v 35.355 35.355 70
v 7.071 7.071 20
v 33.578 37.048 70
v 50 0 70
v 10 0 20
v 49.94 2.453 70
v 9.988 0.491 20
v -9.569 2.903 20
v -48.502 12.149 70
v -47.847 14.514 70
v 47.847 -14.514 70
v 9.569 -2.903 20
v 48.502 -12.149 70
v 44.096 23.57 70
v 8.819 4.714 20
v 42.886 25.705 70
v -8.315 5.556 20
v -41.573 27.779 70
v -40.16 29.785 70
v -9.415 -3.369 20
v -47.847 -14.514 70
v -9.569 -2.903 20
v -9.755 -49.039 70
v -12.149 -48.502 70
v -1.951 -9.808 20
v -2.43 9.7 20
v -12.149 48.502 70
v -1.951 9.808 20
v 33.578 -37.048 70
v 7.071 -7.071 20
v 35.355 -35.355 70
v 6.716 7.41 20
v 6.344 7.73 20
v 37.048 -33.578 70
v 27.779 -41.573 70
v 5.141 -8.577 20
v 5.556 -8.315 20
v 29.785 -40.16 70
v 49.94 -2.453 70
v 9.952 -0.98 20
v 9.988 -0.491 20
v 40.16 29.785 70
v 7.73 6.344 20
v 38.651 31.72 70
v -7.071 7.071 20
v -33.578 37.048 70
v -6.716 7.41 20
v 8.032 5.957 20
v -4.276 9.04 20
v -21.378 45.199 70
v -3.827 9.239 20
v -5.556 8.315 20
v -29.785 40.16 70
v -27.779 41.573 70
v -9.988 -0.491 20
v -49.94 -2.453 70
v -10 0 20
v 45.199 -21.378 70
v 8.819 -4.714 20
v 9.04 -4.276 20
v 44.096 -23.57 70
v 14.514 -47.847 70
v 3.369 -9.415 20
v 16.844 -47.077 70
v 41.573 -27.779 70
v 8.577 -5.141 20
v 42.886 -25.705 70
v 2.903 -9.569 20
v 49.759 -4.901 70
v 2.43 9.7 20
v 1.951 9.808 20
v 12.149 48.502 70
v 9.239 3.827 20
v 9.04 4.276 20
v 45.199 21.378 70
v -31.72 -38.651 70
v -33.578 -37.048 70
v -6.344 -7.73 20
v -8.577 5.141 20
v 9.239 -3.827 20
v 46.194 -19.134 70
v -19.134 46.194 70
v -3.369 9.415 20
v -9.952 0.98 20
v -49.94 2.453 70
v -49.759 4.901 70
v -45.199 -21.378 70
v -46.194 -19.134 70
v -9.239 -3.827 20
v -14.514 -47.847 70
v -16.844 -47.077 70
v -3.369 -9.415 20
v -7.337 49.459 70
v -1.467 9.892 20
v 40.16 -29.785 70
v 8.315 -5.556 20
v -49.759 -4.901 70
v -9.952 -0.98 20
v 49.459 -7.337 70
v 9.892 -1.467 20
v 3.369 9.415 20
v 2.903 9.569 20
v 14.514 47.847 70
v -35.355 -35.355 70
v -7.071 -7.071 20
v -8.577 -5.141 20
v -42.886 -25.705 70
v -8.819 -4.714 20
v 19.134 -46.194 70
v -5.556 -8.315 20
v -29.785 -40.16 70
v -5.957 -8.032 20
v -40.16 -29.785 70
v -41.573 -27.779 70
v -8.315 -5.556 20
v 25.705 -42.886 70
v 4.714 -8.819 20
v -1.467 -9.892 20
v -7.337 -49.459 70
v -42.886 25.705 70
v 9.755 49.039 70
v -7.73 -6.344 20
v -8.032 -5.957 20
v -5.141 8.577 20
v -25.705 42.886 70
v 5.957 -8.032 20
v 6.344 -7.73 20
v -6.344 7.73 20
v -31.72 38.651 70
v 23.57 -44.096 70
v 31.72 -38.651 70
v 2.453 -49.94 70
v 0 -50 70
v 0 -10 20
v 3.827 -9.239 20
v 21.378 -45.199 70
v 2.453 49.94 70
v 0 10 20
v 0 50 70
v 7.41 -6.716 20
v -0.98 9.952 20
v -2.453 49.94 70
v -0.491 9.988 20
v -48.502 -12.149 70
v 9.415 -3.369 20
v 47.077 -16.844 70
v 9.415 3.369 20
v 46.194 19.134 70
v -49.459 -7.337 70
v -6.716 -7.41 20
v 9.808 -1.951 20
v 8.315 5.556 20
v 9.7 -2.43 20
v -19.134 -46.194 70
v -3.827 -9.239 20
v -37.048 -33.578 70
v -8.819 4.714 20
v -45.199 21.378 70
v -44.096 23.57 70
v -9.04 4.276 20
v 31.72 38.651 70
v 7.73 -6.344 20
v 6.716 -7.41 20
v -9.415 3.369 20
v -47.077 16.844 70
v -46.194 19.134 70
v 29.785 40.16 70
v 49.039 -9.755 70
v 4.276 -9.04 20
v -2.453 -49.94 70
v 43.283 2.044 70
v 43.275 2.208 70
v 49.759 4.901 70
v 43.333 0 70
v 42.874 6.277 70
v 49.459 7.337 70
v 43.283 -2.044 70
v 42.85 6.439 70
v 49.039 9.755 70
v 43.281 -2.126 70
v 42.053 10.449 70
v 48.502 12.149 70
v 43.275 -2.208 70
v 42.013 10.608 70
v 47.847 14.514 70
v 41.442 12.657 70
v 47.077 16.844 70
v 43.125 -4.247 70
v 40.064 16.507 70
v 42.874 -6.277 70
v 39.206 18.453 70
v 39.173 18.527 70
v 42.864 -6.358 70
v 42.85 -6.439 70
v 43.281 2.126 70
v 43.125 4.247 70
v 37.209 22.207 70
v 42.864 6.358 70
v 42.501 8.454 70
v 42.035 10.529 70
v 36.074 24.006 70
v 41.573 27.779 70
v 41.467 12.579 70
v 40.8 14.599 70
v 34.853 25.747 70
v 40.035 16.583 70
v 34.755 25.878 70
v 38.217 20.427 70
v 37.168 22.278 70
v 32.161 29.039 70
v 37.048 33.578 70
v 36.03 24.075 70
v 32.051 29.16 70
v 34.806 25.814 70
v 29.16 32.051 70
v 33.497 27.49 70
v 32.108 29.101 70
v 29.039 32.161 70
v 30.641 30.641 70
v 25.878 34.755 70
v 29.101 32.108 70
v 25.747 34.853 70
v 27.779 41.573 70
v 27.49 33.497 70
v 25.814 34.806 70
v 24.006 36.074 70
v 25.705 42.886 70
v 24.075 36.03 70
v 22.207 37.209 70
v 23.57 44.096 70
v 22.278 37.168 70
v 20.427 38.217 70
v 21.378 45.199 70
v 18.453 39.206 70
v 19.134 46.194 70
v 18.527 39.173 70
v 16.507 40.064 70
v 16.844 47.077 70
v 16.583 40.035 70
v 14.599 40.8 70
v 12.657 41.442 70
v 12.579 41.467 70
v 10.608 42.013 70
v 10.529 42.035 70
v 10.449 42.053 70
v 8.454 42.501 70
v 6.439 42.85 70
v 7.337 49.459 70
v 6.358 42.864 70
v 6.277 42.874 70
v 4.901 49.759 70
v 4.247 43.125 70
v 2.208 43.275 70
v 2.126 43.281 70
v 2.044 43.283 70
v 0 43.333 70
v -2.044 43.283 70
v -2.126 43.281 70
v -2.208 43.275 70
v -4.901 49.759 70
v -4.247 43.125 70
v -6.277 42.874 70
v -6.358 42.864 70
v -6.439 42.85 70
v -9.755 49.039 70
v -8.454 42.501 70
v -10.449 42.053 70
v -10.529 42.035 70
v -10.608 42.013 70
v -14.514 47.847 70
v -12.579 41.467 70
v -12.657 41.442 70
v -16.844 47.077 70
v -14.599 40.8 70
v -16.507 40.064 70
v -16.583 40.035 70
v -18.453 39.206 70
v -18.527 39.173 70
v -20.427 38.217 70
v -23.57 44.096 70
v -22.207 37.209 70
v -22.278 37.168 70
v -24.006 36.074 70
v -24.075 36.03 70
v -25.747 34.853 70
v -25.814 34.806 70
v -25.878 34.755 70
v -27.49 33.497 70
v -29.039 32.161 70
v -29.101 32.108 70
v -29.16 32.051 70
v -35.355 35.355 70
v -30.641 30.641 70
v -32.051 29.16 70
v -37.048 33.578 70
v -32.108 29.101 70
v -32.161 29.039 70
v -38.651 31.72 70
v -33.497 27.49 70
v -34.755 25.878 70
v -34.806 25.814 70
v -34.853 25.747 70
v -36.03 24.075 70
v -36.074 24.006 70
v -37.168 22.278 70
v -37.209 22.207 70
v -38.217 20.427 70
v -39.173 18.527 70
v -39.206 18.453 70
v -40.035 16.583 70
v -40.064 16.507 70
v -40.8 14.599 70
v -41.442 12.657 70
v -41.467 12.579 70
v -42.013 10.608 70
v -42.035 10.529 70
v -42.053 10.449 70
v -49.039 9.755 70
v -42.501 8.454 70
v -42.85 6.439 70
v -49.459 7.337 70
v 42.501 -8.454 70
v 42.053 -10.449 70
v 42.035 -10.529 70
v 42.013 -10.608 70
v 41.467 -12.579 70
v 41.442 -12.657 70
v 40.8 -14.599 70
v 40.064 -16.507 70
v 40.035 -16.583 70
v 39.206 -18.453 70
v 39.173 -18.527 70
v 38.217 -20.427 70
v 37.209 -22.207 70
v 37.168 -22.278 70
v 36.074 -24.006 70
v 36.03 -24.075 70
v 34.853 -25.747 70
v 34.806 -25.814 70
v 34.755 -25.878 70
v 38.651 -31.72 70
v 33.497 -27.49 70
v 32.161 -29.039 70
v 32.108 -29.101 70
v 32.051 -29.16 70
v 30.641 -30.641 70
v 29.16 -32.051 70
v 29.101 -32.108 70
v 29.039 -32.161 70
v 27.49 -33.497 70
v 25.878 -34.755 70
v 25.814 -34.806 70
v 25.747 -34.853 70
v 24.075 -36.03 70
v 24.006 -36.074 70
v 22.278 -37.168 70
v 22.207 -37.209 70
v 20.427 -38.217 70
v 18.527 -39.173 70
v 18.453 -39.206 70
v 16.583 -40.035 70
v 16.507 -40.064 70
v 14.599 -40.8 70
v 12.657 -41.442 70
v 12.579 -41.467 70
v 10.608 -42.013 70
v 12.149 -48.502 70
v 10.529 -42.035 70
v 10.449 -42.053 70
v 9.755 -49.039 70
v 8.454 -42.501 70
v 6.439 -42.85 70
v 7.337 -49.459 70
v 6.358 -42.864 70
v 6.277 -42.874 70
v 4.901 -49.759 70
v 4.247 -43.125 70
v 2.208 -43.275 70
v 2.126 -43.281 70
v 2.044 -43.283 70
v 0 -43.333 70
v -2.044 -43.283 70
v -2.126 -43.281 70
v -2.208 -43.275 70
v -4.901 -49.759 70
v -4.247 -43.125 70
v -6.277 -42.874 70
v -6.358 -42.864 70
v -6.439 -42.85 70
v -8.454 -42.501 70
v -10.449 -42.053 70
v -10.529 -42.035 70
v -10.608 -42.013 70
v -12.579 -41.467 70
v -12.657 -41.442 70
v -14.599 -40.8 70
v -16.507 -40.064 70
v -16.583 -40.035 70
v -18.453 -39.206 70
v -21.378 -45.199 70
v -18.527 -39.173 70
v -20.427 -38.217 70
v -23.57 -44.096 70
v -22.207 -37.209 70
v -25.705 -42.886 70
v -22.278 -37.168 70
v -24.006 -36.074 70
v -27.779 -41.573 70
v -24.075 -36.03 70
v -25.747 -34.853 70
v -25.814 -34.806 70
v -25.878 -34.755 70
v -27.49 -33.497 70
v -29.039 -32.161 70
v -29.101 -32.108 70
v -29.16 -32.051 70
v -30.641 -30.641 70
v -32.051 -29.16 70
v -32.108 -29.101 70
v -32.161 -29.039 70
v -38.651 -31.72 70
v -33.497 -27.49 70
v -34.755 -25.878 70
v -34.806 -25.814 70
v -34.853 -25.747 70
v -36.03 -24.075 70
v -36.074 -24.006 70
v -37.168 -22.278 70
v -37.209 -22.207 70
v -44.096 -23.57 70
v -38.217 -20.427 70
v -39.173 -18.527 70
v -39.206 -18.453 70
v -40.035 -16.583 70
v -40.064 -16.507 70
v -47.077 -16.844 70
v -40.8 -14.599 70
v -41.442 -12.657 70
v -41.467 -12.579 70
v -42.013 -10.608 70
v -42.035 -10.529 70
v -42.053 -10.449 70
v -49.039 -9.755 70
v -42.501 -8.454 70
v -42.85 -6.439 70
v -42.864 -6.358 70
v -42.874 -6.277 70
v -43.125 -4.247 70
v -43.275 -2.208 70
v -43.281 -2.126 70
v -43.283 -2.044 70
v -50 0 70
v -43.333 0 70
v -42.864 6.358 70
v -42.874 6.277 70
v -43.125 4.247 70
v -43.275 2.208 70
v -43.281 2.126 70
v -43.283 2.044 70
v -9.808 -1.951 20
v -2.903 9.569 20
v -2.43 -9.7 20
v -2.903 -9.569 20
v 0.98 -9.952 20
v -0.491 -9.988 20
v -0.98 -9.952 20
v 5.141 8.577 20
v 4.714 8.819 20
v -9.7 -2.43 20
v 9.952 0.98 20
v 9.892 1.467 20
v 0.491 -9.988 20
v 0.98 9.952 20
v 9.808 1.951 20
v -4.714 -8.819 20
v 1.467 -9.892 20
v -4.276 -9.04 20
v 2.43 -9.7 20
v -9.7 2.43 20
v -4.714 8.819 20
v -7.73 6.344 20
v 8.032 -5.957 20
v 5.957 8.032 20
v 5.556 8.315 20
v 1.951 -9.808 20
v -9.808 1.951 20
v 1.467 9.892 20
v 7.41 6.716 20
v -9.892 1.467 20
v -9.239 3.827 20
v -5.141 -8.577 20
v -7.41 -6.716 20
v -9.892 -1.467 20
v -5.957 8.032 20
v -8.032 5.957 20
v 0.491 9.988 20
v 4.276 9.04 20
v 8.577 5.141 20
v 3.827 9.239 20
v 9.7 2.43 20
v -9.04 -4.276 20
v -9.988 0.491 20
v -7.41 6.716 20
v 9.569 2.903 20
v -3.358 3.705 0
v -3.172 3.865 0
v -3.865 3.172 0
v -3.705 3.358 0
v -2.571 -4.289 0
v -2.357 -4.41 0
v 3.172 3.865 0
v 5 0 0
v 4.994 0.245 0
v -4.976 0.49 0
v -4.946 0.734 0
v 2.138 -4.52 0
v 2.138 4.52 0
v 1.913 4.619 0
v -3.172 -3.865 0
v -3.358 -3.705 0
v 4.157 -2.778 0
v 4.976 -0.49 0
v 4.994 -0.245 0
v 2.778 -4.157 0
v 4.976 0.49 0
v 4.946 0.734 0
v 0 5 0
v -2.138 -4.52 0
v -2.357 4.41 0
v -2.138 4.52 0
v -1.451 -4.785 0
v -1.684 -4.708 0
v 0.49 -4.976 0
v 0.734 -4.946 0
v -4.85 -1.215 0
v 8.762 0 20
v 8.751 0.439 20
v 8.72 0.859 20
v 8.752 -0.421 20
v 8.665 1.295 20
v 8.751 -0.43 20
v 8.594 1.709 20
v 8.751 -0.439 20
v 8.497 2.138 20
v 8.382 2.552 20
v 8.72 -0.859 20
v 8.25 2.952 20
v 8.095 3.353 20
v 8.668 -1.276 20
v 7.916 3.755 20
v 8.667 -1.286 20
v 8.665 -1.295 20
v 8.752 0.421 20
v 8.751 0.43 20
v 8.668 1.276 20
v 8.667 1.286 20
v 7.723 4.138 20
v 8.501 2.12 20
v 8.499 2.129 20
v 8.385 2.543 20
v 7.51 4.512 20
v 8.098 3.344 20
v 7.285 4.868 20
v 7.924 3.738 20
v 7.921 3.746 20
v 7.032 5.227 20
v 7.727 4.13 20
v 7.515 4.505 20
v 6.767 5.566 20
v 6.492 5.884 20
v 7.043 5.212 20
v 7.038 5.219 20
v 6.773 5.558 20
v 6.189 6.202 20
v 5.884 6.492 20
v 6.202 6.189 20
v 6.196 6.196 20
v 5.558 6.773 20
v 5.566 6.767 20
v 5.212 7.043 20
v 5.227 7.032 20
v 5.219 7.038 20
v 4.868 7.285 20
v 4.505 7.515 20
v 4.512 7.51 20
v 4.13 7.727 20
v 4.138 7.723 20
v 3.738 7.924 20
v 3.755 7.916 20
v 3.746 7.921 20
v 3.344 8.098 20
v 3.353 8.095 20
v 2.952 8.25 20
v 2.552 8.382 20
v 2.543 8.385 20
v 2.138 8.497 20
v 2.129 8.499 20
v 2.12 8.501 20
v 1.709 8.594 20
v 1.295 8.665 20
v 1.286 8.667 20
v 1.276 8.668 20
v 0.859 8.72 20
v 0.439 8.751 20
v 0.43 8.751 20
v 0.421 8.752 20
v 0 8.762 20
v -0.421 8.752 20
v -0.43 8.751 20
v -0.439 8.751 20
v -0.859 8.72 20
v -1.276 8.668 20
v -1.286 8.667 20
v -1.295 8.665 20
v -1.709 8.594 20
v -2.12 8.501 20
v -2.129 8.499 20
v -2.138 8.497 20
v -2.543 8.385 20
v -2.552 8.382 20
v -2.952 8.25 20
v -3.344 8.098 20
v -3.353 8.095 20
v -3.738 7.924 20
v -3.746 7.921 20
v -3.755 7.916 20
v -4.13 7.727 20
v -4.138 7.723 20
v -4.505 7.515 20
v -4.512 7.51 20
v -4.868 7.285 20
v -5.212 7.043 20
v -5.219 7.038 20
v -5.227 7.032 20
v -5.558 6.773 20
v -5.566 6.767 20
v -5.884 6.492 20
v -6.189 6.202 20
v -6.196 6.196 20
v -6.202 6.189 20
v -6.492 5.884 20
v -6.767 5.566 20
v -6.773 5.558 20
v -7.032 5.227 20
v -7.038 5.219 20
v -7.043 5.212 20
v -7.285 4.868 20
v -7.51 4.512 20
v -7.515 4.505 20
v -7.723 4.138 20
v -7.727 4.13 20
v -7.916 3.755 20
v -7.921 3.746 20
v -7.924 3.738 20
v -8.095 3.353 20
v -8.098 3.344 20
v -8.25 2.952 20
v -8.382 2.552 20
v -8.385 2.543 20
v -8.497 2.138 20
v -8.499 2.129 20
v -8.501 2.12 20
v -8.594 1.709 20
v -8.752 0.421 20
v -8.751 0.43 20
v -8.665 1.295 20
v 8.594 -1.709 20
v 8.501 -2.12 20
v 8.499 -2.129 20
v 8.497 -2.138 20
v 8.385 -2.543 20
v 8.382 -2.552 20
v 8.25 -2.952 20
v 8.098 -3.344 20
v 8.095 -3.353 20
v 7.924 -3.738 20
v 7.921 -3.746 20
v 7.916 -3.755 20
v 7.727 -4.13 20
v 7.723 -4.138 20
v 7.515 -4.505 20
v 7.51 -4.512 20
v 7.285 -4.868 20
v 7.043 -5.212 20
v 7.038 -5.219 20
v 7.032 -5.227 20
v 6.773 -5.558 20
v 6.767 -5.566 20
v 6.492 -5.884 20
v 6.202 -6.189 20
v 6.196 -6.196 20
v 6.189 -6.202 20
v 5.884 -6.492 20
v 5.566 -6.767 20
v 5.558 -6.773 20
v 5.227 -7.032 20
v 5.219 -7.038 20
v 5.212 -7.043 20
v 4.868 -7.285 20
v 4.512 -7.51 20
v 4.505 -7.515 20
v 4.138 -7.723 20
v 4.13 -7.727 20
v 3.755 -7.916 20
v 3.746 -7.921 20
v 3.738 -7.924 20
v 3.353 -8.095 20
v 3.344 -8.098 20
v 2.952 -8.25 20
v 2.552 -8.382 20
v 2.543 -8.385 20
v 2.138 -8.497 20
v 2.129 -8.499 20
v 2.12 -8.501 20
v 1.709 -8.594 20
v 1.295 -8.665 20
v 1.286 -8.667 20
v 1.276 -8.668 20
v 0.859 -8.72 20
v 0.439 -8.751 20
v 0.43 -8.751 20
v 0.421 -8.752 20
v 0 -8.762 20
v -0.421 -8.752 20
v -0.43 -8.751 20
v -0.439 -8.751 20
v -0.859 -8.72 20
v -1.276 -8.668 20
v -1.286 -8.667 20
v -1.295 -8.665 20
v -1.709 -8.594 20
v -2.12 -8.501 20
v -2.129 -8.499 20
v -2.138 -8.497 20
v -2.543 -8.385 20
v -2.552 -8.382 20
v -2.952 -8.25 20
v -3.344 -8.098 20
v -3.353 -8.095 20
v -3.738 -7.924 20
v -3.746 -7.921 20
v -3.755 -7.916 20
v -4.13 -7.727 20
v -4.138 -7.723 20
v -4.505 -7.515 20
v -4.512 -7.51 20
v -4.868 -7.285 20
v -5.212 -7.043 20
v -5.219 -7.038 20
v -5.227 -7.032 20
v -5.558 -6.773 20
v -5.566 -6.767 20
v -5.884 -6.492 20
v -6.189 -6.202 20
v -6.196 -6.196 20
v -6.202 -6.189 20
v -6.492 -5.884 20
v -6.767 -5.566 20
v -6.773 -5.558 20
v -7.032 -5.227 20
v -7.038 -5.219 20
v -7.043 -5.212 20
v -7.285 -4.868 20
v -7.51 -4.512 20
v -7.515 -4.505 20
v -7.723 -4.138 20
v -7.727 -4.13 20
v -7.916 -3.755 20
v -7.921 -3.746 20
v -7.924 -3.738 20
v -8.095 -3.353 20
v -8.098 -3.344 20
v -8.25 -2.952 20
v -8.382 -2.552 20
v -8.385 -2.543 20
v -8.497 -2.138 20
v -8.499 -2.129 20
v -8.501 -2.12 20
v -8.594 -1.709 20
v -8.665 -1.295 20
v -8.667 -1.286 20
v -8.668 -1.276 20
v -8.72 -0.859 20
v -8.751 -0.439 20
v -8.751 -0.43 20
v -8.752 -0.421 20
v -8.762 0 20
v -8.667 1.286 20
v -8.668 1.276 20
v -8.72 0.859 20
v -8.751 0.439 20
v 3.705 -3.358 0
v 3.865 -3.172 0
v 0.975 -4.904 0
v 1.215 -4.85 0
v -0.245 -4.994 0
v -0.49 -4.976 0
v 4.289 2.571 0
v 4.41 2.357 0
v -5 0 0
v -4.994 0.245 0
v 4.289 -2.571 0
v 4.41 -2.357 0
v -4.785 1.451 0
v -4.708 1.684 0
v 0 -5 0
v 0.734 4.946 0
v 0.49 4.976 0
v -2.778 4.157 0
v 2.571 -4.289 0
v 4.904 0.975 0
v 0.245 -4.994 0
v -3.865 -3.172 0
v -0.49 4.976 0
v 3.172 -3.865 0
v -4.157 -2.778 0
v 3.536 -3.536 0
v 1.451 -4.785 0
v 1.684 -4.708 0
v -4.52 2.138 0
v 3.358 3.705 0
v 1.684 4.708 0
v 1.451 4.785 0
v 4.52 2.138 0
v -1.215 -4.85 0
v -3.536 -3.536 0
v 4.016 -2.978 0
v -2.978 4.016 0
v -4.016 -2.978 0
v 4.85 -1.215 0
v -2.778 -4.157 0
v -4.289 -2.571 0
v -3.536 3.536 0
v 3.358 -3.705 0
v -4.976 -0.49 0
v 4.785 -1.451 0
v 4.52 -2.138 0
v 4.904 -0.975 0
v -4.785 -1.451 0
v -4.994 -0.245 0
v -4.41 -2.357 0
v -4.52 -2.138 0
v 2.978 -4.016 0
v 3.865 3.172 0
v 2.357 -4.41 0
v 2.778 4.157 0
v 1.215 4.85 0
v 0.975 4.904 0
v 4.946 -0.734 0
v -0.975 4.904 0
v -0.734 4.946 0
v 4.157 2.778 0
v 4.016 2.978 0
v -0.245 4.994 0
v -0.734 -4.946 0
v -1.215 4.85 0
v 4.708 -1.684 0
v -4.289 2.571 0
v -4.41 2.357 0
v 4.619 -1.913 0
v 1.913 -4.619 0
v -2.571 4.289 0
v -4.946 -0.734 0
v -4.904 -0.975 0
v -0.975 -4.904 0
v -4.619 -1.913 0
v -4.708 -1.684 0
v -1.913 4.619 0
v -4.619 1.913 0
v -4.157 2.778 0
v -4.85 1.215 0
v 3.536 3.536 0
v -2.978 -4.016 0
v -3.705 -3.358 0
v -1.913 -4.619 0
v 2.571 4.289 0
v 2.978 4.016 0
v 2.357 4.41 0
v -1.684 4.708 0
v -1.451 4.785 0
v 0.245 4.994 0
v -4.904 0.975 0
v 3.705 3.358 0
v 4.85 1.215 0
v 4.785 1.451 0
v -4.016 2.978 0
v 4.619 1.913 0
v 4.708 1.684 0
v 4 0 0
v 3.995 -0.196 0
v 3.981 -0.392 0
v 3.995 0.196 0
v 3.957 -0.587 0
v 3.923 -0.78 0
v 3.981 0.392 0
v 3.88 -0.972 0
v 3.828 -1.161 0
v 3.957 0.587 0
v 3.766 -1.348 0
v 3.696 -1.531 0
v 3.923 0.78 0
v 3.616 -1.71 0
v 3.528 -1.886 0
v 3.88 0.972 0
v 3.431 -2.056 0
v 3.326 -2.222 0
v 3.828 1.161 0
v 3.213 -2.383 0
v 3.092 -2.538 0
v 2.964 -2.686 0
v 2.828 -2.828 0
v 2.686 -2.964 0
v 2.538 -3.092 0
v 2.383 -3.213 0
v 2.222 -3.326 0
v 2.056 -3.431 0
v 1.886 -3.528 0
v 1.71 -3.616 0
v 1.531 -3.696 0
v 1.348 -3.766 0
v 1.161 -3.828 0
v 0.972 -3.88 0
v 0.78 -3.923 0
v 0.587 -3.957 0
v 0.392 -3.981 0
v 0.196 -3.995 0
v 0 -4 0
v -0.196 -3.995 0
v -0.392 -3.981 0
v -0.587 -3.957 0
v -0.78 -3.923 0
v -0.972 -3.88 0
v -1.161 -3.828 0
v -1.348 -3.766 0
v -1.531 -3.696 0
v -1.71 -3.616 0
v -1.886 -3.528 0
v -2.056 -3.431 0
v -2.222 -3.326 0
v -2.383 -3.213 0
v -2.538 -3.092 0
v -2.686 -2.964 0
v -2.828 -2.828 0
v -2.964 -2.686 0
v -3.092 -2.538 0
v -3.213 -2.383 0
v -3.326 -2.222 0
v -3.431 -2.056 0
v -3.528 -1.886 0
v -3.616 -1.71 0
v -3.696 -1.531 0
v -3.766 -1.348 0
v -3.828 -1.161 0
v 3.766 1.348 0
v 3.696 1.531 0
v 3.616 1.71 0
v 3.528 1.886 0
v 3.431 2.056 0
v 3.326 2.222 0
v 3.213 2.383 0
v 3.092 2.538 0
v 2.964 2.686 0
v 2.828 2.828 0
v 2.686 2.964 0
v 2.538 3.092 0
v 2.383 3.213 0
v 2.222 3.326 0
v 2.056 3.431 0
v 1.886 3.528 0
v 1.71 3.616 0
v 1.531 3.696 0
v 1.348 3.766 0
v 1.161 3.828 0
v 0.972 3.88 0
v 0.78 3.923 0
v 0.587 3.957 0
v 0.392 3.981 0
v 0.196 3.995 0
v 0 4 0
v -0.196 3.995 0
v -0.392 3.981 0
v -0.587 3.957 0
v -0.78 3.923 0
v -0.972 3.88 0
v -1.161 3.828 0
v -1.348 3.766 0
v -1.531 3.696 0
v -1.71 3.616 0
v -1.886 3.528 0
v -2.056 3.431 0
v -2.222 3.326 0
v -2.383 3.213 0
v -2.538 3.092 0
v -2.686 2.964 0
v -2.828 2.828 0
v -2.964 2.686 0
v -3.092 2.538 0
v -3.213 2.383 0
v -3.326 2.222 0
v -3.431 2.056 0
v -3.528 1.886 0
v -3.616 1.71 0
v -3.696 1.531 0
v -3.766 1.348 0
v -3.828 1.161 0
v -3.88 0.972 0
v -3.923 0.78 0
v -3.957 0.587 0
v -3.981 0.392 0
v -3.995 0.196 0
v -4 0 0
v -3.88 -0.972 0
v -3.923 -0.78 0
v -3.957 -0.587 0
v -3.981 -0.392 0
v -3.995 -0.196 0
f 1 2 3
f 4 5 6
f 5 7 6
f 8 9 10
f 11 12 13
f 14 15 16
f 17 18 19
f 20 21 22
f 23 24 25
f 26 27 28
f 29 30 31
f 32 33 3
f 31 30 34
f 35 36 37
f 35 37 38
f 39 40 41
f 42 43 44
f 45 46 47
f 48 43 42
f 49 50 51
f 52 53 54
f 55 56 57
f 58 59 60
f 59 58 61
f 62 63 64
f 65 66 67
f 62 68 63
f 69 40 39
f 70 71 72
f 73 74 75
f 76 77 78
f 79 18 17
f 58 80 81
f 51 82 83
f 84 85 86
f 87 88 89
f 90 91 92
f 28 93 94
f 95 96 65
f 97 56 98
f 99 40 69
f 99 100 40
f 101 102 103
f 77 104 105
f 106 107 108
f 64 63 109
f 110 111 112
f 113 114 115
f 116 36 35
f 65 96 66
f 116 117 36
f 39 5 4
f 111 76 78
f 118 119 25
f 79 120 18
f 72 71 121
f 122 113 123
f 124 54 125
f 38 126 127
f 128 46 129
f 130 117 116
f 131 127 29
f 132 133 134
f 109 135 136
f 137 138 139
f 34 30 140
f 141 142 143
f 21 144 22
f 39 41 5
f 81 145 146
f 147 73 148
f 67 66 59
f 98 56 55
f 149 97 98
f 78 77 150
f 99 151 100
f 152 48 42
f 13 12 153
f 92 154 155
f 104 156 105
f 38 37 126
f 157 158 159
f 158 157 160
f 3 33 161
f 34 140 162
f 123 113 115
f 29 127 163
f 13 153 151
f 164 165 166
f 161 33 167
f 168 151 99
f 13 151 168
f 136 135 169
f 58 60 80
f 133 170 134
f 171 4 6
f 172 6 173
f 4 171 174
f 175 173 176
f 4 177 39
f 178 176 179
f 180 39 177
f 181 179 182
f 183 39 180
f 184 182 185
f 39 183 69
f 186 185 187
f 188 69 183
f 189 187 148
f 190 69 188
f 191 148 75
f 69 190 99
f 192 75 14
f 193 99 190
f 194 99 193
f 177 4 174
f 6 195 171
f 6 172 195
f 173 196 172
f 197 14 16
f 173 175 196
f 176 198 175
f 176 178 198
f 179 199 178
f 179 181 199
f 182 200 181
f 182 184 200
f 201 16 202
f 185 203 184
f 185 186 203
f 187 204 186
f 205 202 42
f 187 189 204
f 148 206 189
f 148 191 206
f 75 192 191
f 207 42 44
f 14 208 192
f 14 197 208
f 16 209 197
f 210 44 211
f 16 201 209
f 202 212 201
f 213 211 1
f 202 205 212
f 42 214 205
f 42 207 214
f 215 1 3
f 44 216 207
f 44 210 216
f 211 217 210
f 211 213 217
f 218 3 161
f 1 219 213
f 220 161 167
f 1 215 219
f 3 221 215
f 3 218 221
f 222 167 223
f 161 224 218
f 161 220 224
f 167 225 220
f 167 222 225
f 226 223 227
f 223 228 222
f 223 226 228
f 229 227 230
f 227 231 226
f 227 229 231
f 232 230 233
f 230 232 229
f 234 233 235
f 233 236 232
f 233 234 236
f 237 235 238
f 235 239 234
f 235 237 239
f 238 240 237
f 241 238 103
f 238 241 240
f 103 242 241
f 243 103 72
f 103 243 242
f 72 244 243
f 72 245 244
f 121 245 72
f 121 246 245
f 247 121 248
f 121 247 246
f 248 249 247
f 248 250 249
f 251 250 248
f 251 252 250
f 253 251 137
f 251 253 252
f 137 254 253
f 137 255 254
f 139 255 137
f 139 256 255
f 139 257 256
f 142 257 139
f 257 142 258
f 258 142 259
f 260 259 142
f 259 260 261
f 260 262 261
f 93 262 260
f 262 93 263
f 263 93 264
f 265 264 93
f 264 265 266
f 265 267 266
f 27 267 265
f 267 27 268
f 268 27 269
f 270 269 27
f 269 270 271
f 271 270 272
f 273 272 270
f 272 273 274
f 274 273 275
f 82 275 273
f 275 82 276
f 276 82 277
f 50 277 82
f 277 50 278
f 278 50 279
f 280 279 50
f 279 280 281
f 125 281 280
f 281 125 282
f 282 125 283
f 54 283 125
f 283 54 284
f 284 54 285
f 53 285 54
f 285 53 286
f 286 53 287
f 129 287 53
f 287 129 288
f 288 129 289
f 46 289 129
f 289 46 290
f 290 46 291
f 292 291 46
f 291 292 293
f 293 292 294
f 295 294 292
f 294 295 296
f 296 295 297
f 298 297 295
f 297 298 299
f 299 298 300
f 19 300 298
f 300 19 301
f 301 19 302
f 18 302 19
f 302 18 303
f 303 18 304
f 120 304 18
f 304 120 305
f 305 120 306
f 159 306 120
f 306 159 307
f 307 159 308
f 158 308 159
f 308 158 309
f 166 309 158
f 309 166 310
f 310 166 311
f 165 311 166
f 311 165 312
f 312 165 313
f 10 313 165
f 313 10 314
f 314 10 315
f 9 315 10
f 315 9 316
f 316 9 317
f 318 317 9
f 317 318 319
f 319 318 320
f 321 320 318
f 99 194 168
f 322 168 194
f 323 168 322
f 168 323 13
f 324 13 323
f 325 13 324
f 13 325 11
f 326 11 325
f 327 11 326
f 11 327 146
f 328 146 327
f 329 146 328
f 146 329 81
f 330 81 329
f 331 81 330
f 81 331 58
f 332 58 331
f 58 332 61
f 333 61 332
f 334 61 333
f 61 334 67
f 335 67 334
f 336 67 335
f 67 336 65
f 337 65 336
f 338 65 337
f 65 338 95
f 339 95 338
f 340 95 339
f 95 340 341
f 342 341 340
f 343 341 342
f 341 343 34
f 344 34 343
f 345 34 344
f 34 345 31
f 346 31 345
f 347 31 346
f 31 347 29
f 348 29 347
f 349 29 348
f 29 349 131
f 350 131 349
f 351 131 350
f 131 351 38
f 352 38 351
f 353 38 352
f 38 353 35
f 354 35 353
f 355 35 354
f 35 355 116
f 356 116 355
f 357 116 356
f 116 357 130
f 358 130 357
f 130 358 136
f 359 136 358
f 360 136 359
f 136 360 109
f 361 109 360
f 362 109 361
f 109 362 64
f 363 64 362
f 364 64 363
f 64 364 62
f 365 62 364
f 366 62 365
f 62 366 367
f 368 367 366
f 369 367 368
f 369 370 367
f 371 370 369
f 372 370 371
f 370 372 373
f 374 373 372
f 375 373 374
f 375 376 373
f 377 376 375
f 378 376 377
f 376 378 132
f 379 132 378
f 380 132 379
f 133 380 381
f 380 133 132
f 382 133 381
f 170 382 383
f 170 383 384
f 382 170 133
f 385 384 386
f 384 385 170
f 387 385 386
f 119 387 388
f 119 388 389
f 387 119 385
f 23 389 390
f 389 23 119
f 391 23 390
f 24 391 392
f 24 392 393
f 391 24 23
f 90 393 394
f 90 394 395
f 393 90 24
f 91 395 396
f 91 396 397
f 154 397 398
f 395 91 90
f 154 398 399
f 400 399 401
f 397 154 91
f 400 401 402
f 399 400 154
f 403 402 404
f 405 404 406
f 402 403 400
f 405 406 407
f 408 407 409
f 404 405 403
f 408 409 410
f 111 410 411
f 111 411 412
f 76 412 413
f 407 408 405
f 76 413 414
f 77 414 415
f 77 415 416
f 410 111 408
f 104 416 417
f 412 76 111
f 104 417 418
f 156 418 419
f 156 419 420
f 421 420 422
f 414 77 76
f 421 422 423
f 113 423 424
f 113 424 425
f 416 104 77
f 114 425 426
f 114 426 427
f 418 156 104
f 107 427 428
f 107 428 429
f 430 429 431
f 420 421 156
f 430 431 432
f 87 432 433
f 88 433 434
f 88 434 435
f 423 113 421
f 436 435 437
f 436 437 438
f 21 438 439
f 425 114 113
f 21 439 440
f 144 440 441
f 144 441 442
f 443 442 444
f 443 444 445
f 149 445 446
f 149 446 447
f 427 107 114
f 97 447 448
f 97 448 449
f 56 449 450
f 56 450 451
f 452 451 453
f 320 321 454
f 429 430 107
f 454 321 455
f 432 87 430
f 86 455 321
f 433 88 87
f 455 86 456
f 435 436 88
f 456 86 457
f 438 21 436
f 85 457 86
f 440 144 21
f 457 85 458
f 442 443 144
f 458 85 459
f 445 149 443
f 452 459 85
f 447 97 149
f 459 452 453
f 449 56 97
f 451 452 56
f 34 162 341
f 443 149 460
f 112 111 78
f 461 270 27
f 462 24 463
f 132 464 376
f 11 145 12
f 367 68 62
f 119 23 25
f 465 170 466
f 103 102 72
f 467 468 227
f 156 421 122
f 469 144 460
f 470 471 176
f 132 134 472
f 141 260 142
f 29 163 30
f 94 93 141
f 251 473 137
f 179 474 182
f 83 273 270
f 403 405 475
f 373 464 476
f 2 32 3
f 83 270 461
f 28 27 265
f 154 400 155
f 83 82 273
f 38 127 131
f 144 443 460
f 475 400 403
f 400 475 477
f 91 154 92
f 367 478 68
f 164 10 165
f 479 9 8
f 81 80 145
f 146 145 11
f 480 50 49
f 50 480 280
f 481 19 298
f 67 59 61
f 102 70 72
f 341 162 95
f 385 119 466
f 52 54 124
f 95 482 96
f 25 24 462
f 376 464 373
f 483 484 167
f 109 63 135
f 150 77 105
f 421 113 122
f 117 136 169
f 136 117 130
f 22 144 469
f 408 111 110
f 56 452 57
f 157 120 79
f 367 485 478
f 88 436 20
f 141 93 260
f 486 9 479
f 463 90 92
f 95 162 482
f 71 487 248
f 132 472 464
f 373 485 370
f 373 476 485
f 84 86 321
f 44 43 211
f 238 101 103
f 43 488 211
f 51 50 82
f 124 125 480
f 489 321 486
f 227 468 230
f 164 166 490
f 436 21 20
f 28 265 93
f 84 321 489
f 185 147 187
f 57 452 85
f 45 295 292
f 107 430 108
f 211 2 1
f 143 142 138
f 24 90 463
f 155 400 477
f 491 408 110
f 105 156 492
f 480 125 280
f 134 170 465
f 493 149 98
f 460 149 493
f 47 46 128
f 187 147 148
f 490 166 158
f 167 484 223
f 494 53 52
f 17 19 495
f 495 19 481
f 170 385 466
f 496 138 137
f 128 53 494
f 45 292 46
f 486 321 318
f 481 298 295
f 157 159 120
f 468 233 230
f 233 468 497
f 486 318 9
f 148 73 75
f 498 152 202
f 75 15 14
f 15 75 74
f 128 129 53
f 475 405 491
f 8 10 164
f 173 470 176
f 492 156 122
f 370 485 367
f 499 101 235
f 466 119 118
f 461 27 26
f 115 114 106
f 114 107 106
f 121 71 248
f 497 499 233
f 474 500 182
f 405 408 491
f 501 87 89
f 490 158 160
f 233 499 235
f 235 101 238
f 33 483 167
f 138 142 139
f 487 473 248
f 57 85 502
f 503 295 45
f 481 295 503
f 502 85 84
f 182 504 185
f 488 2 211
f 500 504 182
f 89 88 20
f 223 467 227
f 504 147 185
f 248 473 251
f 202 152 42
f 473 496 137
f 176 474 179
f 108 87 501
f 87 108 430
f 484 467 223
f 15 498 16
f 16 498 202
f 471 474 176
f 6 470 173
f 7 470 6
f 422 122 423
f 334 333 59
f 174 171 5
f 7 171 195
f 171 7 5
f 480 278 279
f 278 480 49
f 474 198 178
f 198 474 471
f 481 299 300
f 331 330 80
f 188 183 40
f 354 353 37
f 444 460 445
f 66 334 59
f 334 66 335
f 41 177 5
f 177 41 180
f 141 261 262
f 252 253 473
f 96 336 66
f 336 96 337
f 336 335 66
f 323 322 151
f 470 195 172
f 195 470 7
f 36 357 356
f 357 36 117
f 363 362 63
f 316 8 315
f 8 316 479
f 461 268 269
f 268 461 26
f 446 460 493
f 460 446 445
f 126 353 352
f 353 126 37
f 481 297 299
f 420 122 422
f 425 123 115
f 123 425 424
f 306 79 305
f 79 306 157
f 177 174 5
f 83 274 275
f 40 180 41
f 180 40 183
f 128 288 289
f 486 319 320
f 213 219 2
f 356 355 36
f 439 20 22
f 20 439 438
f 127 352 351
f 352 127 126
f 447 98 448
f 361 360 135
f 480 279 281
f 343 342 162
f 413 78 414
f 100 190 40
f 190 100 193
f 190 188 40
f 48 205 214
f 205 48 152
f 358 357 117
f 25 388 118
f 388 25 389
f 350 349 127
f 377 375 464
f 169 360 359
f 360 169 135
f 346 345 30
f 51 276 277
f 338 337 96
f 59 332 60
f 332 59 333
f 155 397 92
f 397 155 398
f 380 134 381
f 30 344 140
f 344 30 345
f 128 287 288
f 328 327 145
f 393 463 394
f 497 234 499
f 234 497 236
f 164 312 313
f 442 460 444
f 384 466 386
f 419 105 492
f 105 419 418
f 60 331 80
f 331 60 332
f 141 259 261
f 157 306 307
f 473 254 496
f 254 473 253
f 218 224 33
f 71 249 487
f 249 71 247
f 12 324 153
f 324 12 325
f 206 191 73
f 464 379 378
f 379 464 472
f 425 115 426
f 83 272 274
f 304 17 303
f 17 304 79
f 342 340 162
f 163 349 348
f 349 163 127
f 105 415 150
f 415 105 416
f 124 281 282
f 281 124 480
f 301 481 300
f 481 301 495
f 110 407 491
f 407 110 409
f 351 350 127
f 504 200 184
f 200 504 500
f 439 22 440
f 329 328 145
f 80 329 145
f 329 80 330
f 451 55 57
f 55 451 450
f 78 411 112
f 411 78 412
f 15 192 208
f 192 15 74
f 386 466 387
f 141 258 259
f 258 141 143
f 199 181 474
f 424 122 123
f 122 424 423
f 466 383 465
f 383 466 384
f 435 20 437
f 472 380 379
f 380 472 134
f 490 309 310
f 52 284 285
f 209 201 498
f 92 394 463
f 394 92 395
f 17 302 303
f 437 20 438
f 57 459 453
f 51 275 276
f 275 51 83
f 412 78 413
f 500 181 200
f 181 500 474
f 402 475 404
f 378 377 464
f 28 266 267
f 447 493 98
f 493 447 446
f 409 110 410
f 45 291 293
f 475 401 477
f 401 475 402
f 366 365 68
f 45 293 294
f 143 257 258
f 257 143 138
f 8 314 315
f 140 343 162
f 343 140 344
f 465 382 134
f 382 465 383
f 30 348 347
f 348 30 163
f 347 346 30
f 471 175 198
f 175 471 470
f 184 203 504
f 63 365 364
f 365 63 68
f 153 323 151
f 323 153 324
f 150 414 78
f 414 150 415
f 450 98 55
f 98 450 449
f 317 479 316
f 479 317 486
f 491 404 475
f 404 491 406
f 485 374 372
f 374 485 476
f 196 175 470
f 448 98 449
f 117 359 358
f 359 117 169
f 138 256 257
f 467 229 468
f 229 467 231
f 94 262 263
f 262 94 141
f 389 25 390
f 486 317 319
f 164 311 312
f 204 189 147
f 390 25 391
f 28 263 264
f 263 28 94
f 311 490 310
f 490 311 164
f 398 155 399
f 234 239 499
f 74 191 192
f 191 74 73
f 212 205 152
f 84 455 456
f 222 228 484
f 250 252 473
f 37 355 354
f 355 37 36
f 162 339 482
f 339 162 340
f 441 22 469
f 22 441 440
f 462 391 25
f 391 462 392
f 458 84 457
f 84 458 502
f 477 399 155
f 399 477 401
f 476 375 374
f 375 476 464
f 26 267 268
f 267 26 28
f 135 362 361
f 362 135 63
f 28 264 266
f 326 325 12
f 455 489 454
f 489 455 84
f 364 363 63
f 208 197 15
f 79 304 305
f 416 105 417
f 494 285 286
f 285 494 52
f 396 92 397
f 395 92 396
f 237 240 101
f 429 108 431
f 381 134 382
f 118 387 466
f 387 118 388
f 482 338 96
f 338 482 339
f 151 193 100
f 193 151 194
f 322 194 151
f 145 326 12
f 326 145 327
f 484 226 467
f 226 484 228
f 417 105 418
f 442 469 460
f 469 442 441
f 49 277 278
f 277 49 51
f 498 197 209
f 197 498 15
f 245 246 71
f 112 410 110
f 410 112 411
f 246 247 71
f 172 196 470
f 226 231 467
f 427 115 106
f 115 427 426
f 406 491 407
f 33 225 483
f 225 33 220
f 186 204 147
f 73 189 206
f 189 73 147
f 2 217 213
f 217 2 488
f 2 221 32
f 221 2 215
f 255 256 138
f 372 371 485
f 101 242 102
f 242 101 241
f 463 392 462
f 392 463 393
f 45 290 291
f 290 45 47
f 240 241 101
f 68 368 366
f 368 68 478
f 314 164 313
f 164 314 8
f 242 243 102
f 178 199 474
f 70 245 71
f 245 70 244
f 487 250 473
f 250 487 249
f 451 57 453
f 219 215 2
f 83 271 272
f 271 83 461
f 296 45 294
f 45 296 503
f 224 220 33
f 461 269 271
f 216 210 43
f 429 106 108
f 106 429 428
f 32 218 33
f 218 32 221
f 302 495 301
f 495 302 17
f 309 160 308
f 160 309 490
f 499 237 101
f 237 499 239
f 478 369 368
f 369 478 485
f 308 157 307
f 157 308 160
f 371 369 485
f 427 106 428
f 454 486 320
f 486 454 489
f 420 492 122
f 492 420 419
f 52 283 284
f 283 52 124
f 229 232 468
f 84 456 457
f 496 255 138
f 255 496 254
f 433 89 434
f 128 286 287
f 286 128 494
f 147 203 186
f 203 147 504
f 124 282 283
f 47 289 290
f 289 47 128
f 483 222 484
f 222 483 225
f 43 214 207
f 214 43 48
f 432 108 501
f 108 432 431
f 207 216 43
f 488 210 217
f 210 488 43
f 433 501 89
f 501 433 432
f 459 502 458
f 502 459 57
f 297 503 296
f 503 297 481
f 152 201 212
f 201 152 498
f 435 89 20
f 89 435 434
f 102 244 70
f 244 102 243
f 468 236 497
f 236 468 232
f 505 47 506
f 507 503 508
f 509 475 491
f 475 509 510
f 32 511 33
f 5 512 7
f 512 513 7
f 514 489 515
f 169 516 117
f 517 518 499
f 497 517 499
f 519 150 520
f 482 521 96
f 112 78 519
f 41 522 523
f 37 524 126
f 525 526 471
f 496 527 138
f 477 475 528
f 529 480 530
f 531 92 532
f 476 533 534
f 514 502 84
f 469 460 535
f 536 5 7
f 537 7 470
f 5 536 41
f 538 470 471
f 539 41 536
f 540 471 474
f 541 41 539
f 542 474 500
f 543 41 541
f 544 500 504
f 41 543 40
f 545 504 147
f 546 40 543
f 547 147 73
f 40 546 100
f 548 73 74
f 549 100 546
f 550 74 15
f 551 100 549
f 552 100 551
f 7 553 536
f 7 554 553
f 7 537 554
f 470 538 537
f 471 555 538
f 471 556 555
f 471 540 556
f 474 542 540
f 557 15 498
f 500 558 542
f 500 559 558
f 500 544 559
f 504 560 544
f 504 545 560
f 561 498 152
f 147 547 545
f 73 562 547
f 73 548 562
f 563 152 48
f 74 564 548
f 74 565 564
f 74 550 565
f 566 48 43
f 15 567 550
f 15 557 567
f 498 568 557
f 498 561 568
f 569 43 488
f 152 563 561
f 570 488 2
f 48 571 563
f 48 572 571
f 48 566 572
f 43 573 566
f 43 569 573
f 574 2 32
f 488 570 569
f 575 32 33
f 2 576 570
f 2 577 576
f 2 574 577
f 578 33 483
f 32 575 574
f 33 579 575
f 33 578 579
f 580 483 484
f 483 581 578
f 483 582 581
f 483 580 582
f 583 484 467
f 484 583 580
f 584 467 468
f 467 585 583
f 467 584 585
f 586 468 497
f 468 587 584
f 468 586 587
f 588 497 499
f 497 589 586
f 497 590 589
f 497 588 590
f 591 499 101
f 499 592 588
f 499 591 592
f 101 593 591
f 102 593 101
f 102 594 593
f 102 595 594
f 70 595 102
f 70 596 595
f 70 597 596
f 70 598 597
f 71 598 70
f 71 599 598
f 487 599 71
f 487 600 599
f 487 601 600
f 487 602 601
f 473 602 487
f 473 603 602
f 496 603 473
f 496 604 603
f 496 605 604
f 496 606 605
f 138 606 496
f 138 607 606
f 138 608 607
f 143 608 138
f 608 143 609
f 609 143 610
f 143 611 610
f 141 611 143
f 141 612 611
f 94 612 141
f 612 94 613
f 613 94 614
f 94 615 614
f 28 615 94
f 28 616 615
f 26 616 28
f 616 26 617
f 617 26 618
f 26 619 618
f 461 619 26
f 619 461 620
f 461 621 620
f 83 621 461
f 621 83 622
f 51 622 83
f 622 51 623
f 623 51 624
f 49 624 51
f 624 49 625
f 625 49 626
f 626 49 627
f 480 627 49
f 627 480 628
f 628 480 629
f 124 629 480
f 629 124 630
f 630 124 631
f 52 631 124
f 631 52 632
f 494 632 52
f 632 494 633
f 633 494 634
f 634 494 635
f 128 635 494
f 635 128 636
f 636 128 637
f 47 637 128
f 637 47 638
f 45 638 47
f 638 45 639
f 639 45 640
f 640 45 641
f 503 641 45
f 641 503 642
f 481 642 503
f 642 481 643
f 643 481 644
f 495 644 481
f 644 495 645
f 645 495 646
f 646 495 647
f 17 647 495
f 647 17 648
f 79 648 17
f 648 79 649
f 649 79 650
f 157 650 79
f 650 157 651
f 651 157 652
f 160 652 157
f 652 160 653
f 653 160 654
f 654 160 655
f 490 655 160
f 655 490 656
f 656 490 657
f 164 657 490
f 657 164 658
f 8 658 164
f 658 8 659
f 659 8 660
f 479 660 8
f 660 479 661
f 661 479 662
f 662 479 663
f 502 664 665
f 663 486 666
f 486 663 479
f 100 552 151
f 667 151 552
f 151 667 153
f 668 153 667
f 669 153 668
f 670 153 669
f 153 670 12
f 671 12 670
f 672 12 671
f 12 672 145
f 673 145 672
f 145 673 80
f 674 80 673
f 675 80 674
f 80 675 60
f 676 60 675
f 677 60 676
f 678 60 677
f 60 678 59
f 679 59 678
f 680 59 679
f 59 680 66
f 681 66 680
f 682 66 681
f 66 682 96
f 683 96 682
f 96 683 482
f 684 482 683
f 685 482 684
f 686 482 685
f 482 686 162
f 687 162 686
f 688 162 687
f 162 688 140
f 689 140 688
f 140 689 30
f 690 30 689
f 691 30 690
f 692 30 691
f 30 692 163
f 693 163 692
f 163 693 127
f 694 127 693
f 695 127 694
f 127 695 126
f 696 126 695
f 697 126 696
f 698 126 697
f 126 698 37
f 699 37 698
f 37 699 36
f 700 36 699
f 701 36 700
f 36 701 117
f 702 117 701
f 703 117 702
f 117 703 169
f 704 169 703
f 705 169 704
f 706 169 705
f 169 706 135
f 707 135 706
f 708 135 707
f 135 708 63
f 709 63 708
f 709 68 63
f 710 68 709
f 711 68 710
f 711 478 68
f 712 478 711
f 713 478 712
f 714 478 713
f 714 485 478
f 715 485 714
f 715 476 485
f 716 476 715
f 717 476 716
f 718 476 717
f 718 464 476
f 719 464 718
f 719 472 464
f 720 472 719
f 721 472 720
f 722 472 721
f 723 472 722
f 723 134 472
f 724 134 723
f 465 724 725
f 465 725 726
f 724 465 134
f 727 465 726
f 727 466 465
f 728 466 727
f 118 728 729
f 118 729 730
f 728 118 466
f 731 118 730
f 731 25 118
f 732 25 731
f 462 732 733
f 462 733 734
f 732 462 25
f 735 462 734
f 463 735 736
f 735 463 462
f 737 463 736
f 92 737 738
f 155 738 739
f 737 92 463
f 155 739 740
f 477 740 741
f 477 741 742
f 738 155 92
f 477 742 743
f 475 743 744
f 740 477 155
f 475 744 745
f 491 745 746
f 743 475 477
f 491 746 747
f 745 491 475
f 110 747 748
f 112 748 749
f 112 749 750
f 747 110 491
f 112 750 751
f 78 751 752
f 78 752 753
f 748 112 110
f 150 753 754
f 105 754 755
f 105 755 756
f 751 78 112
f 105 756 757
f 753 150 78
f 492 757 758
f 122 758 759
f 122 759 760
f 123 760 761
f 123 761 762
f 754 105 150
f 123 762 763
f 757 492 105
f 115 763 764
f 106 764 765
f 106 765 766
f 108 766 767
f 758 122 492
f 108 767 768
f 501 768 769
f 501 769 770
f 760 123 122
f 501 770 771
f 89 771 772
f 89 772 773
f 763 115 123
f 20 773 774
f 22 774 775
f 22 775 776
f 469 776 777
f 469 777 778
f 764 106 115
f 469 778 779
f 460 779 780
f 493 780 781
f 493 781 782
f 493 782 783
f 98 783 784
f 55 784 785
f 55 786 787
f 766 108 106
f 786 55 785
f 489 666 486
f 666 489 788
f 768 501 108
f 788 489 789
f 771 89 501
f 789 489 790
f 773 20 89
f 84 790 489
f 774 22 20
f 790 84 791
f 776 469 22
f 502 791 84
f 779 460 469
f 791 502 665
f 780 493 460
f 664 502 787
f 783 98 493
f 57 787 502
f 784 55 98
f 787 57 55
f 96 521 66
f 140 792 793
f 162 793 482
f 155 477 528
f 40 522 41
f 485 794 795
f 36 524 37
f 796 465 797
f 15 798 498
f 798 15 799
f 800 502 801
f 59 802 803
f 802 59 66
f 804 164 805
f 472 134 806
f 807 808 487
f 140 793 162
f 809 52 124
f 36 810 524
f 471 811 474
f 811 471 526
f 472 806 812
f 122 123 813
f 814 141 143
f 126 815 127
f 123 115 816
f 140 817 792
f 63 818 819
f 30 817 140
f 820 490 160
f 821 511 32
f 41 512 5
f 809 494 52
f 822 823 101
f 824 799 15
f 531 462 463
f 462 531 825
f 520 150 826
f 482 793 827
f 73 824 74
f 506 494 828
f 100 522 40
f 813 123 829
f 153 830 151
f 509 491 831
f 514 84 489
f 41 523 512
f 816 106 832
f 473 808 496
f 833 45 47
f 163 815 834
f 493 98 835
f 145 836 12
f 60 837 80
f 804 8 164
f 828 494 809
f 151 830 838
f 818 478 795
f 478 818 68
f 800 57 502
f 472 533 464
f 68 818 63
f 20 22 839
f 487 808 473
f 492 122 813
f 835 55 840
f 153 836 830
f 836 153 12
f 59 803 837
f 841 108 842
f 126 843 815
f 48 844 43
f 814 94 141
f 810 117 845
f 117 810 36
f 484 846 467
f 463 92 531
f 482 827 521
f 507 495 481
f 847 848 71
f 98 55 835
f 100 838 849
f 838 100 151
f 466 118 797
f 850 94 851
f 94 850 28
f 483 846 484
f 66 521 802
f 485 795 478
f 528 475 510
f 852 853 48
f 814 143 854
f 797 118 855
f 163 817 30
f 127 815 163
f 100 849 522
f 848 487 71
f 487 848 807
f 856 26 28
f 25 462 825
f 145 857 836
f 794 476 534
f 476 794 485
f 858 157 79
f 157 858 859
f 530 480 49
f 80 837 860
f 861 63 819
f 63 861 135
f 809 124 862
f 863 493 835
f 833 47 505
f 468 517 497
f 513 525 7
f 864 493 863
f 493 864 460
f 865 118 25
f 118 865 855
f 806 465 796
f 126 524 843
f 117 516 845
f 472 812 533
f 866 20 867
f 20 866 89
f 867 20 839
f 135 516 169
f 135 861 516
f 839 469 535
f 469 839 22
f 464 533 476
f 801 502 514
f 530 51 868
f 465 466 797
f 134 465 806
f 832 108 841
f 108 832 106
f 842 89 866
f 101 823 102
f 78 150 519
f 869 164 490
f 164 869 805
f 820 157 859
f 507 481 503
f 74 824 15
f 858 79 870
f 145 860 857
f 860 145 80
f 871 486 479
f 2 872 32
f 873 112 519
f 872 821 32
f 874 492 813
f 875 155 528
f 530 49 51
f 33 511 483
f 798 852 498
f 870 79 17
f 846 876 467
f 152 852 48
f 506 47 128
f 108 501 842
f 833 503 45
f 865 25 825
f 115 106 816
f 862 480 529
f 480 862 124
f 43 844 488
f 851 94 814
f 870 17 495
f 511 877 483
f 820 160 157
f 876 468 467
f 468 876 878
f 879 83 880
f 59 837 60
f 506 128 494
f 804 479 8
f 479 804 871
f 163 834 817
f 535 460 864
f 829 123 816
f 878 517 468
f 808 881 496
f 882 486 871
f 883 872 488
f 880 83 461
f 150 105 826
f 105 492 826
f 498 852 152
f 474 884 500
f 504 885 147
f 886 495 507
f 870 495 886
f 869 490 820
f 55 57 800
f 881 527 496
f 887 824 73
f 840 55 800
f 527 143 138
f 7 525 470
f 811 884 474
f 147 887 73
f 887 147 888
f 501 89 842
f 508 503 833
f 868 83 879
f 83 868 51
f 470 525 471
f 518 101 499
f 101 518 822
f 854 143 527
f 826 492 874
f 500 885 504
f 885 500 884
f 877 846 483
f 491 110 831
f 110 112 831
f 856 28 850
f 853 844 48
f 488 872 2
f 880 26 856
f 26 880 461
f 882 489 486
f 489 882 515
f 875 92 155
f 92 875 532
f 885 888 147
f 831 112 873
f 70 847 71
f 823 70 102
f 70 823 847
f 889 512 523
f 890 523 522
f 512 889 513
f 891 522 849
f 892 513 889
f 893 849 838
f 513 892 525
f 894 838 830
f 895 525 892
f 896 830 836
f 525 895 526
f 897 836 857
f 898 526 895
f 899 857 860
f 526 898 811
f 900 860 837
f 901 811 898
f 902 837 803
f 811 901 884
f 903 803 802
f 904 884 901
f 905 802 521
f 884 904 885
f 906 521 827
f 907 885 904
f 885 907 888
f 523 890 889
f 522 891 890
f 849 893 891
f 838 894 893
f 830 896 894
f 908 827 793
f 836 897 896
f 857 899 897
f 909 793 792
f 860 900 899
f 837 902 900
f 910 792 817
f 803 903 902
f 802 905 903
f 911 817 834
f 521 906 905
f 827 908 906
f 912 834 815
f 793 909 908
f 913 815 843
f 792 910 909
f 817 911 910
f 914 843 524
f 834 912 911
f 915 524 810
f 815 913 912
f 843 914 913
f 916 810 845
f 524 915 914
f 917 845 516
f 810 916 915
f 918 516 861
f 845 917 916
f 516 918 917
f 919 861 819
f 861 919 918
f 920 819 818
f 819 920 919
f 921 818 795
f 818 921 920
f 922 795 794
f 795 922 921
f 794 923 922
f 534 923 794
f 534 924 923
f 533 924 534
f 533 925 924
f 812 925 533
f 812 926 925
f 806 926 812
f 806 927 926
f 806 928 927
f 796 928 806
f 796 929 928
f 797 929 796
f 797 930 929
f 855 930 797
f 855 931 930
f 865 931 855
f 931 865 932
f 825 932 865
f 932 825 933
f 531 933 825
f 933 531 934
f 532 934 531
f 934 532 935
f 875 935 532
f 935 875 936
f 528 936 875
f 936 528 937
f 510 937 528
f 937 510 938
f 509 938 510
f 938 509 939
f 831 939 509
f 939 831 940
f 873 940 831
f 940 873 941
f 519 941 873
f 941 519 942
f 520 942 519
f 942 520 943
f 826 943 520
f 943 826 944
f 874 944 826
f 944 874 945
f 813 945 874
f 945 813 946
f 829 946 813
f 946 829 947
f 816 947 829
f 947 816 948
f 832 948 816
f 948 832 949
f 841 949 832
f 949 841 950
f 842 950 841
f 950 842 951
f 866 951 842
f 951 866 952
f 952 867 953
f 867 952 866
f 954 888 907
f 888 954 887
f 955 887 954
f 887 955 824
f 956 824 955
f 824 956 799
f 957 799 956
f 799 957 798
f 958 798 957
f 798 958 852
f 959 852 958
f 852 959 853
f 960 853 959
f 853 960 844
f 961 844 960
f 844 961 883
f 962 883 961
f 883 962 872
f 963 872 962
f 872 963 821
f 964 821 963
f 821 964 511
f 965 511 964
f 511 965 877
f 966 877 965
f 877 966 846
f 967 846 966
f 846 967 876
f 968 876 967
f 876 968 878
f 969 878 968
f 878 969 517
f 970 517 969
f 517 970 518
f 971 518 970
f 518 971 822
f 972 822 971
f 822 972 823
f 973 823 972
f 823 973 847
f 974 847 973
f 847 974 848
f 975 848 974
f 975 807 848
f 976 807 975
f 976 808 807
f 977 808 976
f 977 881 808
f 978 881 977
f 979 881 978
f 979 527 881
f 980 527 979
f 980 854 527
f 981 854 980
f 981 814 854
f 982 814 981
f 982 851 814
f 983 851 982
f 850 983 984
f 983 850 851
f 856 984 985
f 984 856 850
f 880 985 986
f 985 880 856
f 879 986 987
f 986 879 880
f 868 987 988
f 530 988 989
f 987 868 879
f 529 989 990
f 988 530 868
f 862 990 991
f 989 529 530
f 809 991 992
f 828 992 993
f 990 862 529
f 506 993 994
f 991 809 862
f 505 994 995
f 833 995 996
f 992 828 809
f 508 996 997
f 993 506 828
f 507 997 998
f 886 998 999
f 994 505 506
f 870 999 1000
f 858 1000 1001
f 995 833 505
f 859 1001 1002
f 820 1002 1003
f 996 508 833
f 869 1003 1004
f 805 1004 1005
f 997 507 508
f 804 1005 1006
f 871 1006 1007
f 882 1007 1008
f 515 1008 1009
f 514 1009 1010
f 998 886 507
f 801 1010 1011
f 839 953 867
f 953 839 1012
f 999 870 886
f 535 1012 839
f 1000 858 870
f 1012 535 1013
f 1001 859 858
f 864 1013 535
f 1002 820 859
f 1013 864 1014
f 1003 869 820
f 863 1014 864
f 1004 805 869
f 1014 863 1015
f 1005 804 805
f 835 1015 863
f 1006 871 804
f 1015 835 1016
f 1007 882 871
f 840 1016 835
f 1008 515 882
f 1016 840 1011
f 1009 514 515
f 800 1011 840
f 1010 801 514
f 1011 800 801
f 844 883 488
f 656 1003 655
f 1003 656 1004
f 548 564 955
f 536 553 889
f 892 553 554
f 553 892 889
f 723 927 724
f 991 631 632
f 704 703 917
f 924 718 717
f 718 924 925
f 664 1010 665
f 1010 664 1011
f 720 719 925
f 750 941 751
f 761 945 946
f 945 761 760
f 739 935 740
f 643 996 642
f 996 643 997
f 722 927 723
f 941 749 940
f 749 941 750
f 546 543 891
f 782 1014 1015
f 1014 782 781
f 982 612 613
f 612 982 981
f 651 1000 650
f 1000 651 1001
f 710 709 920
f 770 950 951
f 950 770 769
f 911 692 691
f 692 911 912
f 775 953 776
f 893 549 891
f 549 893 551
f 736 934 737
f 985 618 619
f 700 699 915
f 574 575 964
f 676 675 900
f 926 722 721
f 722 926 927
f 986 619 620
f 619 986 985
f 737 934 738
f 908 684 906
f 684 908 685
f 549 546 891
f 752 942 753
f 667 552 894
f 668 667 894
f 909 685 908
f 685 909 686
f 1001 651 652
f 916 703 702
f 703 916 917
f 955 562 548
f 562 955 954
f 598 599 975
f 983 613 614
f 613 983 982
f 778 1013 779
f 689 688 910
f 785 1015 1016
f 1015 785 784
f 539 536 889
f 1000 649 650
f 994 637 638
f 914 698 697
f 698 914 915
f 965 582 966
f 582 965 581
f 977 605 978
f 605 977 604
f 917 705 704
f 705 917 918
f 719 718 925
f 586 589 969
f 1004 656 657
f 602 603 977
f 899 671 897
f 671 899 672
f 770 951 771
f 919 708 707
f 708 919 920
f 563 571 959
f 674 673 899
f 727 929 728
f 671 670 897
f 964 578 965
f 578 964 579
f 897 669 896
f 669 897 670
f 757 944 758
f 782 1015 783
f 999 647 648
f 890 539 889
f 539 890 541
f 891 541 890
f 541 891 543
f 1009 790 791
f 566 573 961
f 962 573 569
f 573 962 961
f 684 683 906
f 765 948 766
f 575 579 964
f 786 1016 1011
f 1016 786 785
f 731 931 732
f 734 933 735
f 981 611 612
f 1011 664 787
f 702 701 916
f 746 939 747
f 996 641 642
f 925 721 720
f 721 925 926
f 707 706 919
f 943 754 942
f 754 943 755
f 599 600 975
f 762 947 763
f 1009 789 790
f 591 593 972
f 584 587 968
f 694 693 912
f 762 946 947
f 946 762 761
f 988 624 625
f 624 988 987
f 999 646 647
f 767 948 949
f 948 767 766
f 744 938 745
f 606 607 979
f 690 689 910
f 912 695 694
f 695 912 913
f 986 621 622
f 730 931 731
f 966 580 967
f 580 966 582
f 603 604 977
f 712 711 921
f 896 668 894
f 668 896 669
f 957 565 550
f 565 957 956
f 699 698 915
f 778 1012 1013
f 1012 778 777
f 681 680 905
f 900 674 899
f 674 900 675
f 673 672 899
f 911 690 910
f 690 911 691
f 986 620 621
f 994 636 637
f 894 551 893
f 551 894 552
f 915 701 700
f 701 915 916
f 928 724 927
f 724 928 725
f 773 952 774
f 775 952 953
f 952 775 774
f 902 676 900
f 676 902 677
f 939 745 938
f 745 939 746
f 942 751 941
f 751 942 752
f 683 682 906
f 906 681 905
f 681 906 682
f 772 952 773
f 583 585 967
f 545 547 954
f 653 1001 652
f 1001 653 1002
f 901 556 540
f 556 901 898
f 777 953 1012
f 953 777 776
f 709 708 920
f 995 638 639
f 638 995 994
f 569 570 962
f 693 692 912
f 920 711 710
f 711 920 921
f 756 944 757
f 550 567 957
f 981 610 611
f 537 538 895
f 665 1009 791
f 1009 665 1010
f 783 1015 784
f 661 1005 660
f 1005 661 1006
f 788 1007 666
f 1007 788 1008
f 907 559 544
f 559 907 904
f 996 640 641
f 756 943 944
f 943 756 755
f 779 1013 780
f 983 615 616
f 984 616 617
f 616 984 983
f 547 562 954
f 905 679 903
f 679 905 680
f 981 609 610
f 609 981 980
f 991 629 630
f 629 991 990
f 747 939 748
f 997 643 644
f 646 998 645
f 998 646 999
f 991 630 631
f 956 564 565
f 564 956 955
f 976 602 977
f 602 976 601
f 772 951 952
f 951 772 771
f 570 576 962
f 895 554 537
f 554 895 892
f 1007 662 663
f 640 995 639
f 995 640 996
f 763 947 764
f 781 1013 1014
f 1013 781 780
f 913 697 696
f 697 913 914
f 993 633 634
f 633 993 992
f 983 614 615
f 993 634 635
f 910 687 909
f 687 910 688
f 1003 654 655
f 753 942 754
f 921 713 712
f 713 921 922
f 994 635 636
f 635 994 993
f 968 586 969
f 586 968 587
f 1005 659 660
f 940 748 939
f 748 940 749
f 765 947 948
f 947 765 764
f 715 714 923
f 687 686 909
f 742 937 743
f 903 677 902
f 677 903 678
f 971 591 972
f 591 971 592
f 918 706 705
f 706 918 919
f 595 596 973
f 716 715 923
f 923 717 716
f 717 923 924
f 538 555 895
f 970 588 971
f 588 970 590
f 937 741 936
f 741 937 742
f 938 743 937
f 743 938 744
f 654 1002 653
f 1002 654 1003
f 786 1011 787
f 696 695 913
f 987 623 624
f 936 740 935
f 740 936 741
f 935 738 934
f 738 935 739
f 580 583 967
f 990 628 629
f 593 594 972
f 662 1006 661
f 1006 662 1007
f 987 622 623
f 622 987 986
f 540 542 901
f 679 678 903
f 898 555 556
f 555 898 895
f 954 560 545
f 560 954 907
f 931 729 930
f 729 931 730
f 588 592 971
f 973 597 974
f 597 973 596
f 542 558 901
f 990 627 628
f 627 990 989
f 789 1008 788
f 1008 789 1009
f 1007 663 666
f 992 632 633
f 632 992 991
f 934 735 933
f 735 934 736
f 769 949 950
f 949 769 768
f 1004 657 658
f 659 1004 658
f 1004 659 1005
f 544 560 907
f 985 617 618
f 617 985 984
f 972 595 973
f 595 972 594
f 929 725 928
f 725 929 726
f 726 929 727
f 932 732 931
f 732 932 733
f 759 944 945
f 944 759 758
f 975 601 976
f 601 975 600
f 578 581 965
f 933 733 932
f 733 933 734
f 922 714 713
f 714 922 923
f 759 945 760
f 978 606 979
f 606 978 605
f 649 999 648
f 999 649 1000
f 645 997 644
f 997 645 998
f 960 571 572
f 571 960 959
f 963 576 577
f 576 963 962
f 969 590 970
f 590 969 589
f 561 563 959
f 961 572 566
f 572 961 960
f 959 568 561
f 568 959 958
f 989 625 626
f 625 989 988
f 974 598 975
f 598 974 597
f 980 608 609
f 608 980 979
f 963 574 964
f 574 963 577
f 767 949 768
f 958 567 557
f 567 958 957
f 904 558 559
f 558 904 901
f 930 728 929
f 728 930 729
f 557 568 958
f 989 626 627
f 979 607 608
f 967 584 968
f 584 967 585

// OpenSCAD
           //Loguncov Maxim 20.01.14\\
//-------------------------------------------\\
 $fn=128;

    difference() {
      translate([0,0,20]) cylinder(50,10,50);
      translate([0,0,20]) cylinder(60,10,50);
    }
    difference() {
      cylinder(20,5,10);
      cylinder(21,4,9);
    
}
